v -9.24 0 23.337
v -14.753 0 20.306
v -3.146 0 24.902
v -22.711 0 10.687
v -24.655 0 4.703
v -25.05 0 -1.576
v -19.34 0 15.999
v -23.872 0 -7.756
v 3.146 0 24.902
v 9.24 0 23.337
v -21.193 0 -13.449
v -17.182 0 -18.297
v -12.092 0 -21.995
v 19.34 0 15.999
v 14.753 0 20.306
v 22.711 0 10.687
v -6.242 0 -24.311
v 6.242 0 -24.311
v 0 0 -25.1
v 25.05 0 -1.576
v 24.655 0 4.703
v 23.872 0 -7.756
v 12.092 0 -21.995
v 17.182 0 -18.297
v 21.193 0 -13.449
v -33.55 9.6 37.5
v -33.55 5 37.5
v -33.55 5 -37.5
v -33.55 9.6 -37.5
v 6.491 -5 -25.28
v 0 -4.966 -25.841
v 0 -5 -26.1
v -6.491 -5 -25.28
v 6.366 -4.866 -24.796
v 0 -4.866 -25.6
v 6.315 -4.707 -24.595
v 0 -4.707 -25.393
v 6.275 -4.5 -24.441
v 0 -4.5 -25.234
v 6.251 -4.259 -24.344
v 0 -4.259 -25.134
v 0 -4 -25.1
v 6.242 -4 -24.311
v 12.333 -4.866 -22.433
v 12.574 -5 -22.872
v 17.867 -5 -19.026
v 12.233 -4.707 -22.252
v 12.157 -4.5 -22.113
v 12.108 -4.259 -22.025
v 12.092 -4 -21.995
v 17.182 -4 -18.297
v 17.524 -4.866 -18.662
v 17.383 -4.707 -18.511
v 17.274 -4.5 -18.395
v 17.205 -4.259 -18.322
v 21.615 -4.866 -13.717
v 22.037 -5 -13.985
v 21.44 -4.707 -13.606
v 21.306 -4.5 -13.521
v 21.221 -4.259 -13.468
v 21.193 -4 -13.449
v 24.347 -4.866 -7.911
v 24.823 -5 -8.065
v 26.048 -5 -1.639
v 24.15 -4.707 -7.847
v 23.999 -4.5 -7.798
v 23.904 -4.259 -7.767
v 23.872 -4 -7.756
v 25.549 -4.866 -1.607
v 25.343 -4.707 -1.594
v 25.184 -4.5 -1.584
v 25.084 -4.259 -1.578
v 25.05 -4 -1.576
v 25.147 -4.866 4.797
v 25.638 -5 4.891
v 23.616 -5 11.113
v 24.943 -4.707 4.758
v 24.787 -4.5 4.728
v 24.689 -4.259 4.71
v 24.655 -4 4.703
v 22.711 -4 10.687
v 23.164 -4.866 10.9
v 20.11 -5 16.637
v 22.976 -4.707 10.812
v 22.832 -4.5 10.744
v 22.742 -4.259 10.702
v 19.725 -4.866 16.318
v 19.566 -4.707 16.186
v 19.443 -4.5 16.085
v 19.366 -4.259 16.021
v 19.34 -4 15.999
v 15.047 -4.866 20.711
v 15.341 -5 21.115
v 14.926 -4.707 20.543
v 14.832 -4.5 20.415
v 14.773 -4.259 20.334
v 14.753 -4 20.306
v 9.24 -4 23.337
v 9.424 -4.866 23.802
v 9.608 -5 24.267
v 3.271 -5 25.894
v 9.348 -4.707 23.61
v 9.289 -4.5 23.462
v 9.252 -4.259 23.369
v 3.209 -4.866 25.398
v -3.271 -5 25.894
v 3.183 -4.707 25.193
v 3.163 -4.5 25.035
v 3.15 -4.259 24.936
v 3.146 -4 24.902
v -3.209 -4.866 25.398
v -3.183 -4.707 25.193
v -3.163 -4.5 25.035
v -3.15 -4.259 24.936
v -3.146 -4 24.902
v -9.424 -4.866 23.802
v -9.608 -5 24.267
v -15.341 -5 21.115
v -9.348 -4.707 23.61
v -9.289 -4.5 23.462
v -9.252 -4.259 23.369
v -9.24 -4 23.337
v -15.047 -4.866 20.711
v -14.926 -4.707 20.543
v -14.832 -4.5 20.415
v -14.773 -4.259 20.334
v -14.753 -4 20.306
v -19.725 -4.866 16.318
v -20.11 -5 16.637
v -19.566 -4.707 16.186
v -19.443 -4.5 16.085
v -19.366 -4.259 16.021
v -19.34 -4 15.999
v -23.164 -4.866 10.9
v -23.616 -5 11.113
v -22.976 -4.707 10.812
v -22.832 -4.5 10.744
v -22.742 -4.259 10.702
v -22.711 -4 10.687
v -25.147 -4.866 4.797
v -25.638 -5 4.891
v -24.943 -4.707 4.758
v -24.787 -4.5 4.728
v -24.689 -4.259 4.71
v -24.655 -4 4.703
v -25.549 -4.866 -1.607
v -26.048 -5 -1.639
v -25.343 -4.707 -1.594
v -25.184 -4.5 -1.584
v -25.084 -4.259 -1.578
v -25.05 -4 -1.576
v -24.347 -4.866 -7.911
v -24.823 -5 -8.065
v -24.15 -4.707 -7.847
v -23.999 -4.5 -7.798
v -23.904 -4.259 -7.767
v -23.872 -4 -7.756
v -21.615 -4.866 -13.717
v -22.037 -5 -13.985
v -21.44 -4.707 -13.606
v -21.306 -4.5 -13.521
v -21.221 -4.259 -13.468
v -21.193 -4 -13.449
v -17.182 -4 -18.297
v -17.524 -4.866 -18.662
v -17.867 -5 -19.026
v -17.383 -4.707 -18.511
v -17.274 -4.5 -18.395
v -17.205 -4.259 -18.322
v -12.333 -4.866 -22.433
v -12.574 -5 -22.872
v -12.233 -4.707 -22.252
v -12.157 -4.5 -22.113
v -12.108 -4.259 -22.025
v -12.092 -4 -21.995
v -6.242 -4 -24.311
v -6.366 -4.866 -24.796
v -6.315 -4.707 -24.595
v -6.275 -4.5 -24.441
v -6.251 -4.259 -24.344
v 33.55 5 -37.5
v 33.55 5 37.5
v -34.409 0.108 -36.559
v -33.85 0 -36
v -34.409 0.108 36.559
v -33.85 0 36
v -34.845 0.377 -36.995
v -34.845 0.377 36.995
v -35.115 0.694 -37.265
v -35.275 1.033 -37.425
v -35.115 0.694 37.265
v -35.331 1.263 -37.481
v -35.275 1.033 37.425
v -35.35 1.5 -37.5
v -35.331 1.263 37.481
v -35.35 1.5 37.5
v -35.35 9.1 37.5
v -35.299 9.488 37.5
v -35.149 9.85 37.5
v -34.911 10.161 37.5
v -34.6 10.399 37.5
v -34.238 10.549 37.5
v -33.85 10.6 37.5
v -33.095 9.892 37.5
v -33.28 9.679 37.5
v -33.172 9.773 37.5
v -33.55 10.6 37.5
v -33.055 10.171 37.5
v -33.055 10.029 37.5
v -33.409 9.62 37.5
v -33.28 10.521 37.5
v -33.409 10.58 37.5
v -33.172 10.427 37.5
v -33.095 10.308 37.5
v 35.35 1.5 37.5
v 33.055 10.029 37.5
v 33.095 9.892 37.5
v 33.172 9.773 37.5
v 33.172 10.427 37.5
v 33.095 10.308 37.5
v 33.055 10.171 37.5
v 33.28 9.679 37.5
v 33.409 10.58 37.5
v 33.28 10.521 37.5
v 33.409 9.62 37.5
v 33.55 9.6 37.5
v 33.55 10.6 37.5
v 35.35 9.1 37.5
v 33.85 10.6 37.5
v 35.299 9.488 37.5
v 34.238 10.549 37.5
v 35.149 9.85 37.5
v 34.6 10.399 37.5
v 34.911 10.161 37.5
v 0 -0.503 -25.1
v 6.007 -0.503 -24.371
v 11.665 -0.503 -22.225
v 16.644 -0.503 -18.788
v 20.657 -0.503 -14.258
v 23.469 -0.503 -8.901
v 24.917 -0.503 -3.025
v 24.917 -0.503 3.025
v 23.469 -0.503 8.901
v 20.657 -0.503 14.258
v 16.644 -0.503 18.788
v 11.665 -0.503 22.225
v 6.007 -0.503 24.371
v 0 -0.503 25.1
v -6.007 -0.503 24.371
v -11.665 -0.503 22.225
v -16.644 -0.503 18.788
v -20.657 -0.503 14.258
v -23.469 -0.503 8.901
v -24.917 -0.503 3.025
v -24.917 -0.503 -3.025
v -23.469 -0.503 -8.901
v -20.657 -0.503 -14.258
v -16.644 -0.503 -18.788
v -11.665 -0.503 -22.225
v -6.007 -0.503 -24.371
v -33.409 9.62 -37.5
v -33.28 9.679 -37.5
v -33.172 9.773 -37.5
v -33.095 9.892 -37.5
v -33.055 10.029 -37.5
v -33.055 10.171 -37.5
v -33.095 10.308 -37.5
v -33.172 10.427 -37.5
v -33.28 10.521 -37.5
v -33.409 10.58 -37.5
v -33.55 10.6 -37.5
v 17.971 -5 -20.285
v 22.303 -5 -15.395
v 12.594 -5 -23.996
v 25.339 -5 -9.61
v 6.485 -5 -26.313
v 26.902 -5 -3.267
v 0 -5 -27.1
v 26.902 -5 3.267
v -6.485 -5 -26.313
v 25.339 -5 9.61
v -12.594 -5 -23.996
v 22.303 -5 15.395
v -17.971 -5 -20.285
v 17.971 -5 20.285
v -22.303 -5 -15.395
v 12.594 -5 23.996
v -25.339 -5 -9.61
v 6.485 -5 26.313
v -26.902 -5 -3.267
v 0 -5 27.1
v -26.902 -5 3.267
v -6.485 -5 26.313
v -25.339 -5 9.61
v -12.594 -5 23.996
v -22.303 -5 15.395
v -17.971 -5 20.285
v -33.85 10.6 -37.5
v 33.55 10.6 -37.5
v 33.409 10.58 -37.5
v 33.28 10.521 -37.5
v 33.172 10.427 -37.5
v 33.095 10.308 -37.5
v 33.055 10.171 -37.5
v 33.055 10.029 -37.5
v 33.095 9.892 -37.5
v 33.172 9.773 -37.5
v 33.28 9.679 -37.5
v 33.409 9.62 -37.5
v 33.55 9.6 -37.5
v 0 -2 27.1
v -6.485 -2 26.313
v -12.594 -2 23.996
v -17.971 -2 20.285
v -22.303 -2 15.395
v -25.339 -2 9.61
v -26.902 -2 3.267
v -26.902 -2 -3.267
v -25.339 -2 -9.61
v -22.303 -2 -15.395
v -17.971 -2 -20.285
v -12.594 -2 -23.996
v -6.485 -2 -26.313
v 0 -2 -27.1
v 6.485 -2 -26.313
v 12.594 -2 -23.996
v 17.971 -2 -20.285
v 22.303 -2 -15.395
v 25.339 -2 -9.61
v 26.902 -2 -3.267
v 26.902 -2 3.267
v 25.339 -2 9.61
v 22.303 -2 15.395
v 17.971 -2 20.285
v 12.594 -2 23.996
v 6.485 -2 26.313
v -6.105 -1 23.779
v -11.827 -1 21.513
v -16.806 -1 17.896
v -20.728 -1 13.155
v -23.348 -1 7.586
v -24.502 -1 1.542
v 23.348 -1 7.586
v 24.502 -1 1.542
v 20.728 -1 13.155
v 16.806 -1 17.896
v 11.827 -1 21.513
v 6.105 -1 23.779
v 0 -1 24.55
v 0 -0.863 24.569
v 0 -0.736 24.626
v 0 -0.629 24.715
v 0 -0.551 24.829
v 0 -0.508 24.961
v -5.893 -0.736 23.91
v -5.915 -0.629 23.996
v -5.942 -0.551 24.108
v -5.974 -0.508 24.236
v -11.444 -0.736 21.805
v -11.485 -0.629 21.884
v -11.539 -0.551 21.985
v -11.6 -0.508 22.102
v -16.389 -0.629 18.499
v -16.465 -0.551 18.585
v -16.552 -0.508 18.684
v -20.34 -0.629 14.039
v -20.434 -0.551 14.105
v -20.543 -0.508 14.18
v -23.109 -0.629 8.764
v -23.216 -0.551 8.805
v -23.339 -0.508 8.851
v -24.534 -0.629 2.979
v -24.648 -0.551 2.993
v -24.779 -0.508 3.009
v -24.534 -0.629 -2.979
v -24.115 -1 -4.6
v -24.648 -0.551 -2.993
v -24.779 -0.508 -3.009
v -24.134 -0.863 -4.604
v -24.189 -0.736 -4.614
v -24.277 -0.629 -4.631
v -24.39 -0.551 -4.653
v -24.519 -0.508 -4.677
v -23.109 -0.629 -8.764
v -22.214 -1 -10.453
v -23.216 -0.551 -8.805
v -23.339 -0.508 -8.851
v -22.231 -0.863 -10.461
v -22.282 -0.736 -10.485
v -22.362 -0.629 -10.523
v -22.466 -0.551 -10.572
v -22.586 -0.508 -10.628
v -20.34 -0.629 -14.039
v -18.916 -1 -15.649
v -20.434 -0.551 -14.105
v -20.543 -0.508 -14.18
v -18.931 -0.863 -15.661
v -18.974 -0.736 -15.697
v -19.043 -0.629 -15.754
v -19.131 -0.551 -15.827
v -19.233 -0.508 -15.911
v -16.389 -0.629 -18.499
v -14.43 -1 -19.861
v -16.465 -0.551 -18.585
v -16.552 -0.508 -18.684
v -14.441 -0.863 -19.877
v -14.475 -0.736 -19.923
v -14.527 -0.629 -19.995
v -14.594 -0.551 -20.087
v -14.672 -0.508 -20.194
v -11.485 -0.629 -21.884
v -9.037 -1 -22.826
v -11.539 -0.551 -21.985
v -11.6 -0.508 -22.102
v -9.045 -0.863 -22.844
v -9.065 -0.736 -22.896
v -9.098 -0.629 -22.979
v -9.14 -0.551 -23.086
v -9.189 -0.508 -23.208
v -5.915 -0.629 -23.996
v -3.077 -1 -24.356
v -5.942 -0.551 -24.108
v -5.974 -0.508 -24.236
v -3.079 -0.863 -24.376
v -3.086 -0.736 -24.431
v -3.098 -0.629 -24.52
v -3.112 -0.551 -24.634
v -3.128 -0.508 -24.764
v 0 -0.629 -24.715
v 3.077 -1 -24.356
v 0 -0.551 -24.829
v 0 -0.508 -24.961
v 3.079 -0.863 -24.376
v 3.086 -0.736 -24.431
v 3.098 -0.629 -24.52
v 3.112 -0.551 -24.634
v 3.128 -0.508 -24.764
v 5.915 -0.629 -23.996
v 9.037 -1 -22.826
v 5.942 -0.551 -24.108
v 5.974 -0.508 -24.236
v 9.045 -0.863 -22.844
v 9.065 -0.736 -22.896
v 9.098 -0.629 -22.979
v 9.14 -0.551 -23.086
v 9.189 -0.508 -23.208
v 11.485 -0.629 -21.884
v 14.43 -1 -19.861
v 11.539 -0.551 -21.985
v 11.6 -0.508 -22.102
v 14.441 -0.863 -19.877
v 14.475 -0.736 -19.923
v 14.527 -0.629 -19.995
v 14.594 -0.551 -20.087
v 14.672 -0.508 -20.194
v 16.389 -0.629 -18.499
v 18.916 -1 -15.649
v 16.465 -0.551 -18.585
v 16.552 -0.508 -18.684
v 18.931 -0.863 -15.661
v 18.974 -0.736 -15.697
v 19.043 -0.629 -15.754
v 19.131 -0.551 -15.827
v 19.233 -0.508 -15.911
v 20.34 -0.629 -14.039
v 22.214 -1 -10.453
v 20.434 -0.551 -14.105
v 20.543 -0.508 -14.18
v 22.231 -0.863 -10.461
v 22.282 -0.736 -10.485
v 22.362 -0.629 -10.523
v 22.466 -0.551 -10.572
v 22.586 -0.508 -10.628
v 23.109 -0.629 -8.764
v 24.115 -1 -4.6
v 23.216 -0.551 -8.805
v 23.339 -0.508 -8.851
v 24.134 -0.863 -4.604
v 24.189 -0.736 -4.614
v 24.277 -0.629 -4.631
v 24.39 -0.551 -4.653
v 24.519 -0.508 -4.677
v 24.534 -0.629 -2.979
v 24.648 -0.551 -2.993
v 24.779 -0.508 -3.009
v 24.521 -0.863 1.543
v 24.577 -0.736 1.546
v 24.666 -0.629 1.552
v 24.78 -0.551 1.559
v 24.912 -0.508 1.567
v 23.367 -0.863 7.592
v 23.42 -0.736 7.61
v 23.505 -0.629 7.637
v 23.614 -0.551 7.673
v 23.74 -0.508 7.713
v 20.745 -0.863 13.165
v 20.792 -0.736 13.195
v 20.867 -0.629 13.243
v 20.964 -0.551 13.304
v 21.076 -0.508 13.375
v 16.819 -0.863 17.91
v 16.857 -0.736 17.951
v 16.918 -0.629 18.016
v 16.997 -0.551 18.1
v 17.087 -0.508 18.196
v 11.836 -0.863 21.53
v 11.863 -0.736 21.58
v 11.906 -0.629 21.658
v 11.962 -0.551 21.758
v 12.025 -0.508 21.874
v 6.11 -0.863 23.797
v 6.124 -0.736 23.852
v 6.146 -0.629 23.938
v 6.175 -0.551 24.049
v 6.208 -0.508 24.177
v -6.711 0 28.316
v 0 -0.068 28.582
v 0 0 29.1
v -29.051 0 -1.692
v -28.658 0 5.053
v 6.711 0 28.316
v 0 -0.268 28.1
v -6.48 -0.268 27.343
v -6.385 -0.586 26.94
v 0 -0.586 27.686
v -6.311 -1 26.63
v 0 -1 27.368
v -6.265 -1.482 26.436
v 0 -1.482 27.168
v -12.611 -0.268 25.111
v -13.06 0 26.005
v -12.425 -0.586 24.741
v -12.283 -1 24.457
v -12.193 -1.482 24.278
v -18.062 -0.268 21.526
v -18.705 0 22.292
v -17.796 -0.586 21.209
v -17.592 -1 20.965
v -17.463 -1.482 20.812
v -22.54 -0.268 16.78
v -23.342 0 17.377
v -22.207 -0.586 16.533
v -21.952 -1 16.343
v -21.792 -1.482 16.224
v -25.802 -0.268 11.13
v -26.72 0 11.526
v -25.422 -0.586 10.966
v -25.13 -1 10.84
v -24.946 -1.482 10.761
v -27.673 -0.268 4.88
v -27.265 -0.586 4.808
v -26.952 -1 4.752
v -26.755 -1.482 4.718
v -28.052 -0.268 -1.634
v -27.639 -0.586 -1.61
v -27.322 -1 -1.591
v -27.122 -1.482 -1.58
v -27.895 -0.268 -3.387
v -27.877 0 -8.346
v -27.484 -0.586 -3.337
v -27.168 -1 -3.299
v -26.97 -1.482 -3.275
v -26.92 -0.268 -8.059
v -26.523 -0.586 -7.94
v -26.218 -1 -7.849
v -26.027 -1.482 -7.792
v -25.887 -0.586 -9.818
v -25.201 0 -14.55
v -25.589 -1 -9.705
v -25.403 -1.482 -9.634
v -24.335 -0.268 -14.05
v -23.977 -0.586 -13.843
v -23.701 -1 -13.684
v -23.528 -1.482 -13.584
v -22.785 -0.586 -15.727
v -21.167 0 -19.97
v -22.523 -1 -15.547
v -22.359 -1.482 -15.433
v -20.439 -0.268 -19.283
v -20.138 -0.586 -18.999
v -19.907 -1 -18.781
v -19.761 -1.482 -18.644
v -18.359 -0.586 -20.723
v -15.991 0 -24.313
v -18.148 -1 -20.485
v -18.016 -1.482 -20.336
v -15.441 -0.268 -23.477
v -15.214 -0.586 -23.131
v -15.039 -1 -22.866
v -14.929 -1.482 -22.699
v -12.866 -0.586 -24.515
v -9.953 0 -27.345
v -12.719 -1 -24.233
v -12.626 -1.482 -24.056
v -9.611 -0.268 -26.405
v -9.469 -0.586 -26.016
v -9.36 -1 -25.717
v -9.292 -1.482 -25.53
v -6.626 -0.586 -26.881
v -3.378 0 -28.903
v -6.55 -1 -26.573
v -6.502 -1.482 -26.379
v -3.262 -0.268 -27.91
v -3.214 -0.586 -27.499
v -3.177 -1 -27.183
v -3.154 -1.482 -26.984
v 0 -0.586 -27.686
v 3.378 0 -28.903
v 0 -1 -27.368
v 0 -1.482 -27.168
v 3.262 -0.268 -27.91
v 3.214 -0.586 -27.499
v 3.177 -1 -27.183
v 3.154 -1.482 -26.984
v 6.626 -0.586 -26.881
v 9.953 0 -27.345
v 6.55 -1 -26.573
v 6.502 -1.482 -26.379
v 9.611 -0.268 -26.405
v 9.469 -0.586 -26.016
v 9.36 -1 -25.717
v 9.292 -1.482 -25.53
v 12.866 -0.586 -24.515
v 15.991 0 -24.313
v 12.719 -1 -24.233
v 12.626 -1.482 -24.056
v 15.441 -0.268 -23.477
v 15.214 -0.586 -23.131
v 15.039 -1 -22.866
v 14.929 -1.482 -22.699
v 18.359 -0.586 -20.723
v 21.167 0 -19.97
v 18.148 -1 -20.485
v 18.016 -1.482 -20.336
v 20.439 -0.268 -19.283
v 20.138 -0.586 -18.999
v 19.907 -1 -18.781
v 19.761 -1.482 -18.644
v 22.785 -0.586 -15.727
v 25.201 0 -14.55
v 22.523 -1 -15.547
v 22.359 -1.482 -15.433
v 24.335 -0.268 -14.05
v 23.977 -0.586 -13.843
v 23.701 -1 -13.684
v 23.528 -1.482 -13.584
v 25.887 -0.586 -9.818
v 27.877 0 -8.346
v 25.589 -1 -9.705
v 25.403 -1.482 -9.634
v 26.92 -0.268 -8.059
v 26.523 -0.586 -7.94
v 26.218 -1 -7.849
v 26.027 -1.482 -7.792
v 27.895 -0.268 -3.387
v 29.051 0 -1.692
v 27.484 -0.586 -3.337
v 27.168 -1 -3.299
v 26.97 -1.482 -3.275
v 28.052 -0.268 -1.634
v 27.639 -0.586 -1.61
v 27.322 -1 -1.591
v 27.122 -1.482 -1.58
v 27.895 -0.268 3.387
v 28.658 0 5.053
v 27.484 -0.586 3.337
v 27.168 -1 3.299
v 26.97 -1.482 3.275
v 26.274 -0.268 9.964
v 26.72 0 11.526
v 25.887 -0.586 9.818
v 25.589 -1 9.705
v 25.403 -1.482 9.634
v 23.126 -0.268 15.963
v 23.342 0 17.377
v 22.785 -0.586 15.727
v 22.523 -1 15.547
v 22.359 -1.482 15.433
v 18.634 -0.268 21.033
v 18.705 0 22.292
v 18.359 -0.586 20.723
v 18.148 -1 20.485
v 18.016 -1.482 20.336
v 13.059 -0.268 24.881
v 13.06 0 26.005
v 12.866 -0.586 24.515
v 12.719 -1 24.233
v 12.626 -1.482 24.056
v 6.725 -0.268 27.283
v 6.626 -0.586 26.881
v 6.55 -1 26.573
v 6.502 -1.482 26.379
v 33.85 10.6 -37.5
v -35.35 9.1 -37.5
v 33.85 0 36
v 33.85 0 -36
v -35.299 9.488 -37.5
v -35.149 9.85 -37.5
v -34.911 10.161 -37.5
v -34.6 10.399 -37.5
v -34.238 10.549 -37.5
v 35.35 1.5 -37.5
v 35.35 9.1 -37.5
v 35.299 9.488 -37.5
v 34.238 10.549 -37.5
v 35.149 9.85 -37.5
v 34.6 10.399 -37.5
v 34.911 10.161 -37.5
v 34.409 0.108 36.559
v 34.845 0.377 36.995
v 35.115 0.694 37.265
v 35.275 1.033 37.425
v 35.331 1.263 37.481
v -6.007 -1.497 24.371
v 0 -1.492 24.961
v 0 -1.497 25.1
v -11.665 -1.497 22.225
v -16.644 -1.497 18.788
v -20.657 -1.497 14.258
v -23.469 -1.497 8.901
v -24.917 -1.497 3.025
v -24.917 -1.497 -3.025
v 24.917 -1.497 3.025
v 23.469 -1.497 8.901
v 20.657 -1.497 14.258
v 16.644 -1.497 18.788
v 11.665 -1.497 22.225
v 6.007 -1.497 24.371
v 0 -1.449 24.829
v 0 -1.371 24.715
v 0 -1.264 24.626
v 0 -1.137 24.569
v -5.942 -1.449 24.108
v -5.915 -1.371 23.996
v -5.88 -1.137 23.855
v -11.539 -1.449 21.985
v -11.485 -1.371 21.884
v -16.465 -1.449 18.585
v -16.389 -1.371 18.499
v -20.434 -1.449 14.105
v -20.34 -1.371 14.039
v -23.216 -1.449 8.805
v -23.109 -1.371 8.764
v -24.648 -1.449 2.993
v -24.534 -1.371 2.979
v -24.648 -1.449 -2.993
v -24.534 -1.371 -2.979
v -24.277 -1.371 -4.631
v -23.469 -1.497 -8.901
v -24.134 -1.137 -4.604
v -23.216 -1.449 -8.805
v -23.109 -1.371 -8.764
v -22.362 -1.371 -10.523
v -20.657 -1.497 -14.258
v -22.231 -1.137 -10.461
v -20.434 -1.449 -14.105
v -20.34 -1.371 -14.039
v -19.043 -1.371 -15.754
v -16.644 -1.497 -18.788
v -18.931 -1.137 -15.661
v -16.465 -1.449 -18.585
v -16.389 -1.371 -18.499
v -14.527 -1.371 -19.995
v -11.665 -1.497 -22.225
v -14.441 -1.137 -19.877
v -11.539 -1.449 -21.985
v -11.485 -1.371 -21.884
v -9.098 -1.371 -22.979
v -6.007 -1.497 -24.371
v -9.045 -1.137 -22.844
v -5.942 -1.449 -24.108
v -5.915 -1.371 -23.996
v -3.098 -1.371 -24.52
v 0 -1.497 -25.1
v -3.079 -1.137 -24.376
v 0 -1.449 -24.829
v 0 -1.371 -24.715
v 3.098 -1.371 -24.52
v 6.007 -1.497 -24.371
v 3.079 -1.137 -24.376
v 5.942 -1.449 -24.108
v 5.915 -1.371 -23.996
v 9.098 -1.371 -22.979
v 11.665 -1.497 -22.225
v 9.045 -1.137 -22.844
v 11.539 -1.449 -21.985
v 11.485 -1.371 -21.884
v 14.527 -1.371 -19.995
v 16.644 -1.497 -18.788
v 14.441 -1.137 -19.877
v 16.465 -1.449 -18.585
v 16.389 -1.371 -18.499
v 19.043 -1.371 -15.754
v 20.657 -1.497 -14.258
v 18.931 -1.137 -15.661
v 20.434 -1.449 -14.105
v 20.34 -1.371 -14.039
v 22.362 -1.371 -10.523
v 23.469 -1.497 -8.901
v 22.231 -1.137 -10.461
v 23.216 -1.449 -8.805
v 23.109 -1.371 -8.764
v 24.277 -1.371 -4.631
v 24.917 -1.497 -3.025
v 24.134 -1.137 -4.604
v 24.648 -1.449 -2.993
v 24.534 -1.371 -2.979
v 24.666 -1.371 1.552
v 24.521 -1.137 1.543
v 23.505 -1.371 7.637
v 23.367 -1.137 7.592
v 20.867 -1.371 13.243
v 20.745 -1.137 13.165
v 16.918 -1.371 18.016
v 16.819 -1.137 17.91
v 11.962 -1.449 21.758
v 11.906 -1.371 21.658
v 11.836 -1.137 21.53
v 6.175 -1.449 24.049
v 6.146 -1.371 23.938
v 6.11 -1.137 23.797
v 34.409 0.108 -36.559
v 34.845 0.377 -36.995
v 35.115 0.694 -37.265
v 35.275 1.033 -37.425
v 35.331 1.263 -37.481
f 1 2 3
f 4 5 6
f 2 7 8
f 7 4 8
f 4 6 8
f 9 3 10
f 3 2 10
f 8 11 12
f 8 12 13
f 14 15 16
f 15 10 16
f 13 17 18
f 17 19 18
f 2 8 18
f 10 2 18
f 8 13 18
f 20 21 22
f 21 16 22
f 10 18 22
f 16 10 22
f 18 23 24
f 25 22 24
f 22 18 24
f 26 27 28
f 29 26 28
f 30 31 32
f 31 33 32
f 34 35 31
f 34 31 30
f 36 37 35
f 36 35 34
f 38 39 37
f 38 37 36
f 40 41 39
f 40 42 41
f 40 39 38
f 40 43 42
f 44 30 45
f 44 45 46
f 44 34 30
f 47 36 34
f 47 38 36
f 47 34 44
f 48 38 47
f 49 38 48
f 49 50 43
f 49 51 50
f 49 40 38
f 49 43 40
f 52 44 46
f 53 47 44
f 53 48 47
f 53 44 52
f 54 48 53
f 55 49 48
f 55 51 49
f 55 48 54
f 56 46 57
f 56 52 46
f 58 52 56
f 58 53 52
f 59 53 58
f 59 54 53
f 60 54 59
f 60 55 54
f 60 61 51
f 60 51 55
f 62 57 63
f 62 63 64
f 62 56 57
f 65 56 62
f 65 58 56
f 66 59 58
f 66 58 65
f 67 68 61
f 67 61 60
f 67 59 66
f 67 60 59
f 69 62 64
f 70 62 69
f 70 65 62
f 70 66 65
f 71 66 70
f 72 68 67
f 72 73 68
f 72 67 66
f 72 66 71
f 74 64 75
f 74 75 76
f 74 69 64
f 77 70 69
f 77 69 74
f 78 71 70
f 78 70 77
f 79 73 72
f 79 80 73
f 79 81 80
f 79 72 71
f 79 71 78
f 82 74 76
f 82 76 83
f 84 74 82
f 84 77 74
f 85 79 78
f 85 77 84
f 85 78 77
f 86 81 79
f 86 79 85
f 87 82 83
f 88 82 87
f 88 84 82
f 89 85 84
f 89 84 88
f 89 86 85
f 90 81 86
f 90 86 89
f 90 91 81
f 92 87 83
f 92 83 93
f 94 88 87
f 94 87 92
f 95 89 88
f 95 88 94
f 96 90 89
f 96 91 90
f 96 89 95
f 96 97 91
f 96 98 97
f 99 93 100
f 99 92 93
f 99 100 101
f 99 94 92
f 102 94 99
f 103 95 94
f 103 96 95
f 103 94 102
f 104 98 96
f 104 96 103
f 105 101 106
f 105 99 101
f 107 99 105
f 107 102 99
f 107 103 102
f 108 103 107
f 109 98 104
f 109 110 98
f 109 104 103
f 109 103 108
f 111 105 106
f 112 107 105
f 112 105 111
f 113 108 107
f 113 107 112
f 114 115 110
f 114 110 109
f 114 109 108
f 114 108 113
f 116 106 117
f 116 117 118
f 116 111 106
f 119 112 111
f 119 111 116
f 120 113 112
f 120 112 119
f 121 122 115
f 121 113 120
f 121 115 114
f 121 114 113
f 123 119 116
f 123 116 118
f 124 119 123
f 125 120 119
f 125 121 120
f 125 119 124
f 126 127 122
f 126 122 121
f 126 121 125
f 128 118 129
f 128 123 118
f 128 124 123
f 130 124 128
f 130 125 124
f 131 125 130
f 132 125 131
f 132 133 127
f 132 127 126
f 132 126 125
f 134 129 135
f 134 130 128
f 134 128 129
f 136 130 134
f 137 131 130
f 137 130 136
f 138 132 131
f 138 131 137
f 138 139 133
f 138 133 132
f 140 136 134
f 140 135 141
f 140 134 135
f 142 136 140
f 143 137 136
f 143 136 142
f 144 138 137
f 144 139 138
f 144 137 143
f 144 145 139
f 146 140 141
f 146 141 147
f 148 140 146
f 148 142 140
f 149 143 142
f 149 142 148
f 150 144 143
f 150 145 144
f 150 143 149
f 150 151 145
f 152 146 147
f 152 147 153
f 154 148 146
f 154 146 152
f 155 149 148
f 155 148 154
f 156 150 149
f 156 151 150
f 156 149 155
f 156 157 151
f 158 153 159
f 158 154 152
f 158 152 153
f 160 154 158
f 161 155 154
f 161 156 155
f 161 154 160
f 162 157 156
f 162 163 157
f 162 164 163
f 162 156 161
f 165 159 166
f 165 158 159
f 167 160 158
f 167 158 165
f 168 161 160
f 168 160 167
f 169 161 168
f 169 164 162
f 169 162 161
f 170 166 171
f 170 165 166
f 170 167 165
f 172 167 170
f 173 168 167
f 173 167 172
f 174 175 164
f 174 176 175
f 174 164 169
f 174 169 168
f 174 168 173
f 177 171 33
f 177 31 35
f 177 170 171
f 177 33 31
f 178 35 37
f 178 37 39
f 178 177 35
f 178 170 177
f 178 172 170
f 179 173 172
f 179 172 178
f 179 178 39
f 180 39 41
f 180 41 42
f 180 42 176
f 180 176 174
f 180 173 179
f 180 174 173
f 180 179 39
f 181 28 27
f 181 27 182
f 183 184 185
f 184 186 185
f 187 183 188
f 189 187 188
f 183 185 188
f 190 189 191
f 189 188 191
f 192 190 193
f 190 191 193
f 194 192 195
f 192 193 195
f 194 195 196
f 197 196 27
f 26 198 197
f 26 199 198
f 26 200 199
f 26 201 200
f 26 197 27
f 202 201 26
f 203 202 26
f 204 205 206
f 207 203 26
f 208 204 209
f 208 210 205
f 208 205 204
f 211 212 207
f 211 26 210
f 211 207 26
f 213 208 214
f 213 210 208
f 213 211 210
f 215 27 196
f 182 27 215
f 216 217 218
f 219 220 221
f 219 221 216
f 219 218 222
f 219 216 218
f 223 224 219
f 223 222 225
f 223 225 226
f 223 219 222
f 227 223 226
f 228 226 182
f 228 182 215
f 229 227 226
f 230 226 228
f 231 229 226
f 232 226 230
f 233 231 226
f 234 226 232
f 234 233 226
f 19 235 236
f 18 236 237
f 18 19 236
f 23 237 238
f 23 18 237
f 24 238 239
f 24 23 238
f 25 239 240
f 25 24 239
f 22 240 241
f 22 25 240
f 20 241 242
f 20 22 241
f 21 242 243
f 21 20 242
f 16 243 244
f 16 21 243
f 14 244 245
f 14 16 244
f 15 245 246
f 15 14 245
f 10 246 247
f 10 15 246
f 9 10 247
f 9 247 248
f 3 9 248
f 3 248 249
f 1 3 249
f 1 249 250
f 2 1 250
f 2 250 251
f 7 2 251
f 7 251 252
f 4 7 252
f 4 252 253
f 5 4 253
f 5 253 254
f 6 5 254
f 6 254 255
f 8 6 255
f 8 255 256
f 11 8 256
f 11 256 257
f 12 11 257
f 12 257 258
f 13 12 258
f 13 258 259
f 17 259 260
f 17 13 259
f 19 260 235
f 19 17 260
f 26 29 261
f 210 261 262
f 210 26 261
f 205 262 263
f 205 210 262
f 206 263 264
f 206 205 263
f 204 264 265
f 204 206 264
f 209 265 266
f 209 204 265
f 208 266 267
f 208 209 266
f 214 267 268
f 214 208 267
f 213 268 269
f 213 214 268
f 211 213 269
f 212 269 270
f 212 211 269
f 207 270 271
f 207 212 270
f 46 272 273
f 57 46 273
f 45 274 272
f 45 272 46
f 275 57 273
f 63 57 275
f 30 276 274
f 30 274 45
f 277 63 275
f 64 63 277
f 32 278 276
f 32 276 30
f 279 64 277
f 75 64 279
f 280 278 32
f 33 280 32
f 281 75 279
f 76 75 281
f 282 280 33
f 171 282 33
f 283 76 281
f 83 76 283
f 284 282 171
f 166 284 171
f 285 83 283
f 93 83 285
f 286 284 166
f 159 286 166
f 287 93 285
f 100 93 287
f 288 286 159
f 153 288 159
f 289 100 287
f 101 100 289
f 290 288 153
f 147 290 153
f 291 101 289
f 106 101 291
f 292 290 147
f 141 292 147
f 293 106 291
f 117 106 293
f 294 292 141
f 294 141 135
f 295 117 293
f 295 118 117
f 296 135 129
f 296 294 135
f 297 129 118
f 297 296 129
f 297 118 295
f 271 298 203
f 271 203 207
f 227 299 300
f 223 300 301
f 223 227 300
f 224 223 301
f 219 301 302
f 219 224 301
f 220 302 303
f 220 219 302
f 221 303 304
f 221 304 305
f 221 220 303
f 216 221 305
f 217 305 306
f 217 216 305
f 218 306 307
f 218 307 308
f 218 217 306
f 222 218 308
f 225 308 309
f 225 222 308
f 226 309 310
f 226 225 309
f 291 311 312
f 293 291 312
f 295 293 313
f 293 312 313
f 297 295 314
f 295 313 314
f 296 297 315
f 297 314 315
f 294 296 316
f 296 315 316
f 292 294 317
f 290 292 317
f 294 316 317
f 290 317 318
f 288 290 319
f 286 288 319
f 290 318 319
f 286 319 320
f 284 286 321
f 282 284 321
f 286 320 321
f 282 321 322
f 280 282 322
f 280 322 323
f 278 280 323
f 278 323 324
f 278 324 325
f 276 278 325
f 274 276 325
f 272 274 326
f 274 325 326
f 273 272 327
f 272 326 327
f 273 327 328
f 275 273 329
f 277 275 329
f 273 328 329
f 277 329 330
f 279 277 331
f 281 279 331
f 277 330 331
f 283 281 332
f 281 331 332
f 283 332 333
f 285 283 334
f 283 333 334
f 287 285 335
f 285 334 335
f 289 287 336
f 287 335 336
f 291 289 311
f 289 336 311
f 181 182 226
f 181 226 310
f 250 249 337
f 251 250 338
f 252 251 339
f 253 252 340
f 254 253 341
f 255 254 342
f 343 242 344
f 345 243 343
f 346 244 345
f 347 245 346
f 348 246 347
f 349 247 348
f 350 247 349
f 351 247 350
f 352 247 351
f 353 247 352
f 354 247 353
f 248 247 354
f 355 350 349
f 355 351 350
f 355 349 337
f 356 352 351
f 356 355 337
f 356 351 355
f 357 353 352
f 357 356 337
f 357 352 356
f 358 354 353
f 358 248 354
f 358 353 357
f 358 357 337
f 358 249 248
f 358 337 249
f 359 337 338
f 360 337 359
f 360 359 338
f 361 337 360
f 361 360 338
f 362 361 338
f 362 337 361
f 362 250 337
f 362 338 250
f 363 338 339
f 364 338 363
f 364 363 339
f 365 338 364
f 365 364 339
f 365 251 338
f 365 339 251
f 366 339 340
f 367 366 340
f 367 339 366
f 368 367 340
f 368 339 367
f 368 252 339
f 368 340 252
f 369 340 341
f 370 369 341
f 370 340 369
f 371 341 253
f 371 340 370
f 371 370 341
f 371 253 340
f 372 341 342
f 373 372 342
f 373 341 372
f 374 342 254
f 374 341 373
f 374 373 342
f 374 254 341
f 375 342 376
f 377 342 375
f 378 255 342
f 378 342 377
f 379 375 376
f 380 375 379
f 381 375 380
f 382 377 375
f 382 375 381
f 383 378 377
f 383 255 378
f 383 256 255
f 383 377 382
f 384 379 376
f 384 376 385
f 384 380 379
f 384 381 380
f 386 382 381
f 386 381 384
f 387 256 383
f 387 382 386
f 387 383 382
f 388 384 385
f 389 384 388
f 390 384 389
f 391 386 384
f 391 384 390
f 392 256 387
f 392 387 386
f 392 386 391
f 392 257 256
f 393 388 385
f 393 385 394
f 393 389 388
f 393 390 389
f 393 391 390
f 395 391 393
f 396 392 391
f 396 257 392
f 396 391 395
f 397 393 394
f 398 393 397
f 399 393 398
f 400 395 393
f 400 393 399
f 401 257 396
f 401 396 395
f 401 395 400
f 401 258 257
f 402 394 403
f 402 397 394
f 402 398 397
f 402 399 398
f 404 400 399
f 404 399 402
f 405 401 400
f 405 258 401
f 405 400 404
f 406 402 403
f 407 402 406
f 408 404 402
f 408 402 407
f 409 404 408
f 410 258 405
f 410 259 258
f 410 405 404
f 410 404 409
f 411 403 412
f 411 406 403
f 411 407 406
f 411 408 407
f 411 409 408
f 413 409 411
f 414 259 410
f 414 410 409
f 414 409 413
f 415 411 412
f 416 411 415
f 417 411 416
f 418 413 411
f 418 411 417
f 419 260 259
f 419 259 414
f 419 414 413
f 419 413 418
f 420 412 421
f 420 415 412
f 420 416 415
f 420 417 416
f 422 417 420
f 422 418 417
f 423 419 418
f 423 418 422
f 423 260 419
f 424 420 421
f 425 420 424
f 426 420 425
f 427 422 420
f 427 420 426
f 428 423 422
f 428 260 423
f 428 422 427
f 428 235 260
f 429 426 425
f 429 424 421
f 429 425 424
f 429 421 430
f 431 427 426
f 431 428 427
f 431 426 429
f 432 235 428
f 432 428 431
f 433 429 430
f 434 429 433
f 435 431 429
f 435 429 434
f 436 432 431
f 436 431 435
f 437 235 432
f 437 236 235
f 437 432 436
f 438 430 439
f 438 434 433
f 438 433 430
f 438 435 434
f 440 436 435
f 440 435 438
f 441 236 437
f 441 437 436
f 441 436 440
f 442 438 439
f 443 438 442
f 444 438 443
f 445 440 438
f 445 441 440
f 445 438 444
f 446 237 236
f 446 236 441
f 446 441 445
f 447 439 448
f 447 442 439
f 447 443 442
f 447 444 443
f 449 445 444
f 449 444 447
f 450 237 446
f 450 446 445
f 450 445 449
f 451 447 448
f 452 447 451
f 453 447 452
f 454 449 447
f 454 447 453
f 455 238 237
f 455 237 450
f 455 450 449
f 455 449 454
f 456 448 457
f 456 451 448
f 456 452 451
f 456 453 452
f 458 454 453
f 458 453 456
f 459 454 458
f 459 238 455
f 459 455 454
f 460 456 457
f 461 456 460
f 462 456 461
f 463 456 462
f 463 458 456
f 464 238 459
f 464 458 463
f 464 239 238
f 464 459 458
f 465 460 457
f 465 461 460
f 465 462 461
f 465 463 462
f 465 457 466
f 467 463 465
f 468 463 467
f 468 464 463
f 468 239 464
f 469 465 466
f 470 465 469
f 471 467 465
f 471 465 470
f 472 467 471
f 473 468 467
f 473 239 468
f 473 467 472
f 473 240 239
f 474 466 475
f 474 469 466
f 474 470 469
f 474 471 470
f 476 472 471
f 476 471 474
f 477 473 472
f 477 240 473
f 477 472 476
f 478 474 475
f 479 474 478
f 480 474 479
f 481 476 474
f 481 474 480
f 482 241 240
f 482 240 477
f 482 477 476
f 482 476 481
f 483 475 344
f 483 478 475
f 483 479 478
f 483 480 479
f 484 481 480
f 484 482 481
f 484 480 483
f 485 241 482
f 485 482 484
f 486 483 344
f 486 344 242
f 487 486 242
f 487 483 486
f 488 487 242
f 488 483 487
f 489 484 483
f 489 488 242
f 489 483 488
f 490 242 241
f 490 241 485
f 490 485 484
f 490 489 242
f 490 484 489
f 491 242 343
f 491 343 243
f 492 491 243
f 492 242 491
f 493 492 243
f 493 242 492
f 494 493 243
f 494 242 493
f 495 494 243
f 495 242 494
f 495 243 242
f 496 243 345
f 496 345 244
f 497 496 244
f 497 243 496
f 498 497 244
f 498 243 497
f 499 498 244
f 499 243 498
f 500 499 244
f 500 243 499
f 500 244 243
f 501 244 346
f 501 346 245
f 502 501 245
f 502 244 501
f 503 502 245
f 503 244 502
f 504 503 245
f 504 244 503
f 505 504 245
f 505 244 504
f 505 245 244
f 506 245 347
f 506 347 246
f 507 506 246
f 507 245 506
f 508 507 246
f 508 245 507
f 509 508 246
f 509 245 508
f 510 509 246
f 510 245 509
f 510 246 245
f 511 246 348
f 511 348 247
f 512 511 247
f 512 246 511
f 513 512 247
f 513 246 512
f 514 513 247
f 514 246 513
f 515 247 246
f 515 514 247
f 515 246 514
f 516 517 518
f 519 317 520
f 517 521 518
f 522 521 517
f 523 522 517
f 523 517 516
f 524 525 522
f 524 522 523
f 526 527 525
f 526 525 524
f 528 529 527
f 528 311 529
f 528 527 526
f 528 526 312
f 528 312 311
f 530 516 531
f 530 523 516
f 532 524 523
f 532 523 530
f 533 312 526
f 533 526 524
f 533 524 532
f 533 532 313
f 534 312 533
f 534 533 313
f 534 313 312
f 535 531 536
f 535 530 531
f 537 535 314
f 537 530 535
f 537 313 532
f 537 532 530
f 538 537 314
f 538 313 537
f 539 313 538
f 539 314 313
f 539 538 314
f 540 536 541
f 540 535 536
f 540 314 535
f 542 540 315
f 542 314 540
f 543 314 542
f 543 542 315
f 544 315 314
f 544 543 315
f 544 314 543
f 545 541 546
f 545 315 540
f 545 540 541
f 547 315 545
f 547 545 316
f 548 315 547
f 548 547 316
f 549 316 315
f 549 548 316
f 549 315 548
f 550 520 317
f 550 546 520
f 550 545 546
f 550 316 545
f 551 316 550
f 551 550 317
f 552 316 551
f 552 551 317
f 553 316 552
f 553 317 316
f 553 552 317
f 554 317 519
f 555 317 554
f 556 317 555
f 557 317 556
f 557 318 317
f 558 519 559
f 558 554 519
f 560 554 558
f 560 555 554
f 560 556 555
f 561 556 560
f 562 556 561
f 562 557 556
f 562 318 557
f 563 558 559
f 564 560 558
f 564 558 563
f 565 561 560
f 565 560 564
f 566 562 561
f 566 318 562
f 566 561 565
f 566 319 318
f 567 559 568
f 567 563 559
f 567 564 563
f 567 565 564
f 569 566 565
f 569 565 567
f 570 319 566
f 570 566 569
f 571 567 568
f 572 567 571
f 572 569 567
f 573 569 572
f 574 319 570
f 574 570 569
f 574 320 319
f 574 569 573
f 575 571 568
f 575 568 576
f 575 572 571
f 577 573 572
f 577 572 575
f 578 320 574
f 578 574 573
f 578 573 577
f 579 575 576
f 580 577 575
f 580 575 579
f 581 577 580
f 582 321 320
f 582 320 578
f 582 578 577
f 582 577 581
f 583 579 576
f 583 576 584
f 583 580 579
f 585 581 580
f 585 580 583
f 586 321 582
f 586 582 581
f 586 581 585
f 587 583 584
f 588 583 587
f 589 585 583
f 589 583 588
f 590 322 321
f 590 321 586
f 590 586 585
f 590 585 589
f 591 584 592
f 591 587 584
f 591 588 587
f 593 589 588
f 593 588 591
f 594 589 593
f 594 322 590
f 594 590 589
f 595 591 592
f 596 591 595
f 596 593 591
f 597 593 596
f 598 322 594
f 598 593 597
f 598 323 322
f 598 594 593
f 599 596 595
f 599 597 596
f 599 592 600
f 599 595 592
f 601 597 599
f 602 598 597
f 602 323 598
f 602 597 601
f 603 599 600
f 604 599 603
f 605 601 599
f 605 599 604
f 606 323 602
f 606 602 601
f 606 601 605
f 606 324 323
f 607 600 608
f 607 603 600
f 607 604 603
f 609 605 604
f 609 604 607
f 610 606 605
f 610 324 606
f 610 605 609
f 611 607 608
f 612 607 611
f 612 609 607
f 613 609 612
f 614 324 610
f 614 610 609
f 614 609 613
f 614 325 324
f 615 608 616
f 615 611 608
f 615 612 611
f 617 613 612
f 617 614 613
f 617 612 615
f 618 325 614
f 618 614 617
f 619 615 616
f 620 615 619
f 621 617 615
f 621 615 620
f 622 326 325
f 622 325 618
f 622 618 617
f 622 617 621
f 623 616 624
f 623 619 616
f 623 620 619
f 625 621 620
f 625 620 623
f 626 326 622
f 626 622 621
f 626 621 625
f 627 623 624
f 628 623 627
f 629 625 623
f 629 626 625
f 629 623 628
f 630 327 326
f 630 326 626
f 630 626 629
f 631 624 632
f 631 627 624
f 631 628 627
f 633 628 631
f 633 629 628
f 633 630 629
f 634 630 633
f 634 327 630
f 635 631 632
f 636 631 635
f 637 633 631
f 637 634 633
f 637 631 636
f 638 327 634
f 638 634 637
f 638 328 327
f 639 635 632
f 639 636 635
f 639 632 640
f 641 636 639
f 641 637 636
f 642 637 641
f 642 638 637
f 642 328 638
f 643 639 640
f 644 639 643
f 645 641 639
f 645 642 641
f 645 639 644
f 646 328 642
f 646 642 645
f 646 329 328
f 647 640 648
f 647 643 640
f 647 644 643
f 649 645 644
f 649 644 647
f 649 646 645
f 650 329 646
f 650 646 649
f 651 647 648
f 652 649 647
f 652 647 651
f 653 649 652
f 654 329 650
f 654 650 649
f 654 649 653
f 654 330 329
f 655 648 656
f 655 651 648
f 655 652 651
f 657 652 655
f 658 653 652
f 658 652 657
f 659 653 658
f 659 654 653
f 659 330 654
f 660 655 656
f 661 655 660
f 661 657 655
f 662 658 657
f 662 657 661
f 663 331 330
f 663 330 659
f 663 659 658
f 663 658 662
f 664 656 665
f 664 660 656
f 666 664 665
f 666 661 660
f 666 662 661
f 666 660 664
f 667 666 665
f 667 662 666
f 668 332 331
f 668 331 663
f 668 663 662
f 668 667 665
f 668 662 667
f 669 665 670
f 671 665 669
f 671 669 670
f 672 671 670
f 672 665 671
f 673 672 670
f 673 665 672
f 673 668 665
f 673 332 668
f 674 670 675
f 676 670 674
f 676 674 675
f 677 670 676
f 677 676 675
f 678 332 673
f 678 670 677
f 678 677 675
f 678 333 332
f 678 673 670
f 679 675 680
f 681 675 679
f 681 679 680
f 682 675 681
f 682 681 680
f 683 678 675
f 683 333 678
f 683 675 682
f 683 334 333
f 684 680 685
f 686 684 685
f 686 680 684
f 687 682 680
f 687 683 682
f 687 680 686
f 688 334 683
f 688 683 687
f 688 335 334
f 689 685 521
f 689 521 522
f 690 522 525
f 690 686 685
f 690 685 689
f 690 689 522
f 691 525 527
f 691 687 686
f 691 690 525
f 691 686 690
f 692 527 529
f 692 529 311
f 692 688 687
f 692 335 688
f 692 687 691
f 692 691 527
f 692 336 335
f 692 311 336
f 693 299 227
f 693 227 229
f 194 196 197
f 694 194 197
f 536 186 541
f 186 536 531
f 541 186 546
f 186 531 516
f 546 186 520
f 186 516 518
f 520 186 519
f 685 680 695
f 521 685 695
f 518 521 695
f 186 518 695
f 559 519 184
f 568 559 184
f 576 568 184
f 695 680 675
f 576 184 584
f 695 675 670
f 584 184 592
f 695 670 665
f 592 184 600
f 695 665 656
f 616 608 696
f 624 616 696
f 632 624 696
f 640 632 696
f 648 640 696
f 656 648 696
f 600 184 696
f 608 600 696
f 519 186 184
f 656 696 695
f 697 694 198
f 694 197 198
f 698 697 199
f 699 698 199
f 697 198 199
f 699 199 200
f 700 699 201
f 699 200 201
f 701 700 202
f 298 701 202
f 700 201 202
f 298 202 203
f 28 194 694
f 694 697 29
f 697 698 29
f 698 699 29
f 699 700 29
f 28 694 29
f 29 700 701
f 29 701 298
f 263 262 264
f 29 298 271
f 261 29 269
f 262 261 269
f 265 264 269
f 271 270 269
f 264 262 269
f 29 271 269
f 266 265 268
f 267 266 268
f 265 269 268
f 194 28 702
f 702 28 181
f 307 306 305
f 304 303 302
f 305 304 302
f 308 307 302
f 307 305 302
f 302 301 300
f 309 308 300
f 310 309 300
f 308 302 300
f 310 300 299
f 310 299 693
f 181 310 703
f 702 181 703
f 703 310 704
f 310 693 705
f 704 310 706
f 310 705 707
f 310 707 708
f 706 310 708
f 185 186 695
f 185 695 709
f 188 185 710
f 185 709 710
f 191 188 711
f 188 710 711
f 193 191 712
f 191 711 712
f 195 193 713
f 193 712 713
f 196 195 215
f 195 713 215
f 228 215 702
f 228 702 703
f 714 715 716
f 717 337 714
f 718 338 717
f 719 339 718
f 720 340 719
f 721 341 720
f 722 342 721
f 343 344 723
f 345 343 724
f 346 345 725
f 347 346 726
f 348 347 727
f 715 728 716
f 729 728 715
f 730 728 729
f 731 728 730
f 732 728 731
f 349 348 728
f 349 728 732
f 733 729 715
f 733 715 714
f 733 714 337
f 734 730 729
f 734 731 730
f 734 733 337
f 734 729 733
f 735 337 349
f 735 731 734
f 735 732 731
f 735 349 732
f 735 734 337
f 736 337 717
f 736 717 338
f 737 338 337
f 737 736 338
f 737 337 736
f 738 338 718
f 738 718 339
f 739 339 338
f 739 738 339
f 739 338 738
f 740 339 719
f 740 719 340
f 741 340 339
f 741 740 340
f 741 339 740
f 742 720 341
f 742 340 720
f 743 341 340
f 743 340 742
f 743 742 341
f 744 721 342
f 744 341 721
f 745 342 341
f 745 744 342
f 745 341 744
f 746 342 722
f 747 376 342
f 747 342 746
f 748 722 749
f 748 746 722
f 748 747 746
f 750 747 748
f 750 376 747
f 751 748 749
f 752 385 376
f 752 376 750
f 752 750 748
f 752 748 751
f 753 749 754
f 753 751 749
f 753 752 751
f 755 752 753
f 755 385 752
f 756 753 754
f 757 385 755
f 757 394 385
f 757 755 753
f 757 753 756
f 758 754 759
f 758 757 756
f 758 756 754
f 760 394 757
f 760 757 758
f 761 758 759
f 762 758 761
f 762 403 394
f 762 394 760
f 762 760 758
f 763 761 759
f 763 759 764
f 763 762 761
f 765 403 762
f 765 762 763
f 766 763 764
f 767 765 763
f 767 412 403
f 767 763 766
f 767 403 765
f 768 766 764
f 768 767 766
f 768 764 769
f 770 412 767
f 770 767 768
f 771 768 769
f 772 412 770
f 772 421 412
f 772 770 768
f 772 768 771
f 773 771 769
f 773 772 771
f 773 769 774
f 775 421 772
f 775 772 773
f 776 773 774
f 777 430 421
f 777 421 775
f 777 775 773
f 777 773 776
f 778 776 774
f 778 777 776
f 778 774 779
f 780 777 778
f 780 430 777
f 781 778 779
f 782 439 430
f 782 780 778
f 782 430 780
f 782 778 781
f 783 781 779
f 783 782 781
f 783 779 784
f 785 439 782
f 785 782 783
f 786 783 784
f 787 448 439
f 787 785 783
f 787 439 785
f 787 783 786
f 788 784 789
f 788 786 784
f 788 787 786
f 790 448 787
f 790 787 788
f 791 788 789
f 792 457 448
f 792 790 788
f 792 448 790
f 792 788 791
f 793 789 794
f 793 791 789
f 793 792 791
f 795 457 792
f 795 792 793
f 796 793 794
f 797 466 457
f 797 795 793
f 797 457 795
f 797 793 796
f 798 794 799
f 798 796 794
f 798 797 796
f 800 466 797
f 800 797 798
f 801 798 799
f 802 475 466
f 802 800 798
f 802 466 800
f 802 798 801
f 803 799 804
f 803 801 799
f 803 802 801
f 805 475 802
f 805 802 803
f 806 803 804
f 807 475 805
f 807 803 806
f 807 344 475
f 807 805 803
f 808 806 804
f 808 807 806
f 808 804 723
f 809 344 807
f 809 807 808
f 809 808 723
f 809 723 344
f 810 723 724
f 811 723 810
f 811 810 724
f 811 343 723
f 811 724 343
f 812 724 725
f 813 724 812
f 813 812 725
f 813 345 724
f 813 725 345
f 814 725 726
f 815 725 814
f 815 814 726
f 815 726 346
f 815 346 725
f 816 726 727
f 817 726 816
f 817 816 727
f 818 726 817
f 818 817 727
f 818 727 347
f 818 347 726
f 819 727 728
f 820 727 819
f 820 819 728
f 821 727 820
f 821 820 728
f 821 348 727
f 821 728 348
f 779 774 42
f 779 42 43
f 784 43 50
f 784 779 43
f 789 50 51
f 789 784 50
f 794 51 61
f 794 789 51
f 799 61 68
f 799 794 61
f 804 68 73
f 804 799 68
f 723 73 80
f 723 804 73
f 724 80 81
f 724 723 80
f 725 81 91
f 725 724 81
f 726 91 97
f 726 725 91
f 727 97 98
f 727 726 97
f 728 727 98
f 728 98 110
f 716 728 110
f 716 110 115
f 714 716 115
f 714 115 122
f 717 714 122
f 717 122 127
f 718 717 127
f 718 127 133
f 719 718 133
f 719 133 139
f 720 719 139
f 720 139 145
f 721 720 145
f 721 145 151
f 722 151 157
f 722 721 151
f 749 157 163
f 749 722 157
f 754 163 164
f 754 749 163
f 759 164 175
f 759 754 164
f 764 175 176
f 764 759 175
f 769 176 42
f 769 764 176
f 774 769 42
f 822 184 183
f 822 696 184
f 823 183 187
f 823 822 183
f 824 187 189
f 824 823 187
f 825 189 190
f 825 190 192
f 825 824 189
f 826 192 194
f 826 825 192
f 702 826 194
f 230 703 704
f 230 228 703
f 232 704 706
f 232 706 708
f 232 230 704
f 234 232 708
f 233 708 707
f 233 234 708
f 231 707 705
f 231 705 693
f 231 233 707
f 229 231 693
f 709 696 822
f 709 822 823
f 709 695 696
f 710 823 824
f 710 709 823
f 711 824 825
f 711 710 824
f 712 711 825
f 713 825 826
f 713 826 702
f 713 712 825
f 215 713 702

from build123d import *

# Parameters (mm, degrees)
SKETCH1_W           = 72.5
SKETCH1_H           = 75
BOSS_EXTRUDE1_DEPTH = 5
SKETCH2_R           = 27.1
SKETCH2_R_2         = 25.1
BOSS_EXTRUDE2_DEPTH = 5
SKETCH4_W           = 2.7
SKETCH4_H           = 75
BOSS_EXTRUDE3_DEPTH = 5.6
SKETCH5_R           = 0.5
BOSS_EXTRUDE4_DEPTH = 75
SKETCH6_W           = 0.9
SKETCH6_H           = 10.6
CUT_EXTRUDE1_DEPTH  = 84.972748556
FILLET1_R           = 2
FILLET2_R           = 1
FILLET3_R           = 1.5
FILLET4_R           = 1.5
SKETCH3_R           = 0.5


with BuildPart() as part:
    # Sketch1 → Boss-Extrude1 (new body)
    with BuildSketch(Plane(origin=(0, 0, 0), x_dir=(1, 0, 0), z_dir=(0, 1, 0))):
        Rectangle(SKETCH1_W, SKETCH1_H)
    extrude(amount=BOSS_EXTRUDE1_DEPTH)

    # Sketch2 → Boss-Extrude2 (add)
    with BuildSketch(Plane.XZ):
        with Locations(Location((0, 0, 0), (0, 0, 90))):
            Circle(SKETCH2_R)
        with Locations(Location((0, 0, 0), (0, 0, 270))):
            Circle(SKETCH2_R_2, mode=Mode.SUBTRACT)
    extrude(amount=BOSS_EXTRUDE2_DEPTH)

    # Sketch4 → Boss-Extrude3 (add)
    with BuildSketch(Plane(origin=(0, 5, 0), x_dir=(1, 0, 0), z_dir=(0, 1, 0))):
        with Locations((-34.9, 0)):
            Rectangle(SKETCH4_W, SKETCH4_H)
        with Locations((34.9, 0)):
            Rectangle(SKETCH4_W, SKETCH4_H)
    extrude(amount=BOSS_EXTRUDE3_DEPTH)

    # Sketch5 → Boss-Extrude4 (add)
    with BuildSketch(Plane.XY.offset(37.5)):
        with Locations((-33.55, 10.1)):
            Circle(SKETCH5_R)
        with Locations((33.55, 10.1)):
            Circle(SKETCH5_R)
    extrude(amount=-BOSS_EXTRUDE4_DEPTH)

    # Sketch6 → Cut-Extrude1 (cut, through all)
    with BuildSketch(Plane(origin=(0, 0, -37.5), x_dir=(-1, 0, 0), z_dir=(0, 0, -1))):
        with Locations((-35.8, 5.3)):
            Rectangle(SKETCH6_W, SKETCH6_H)
        with Locations((35.8, 5.3)):
            Rectangle(SKETCH6_W, SKETCH6_H)
    extrude(amount=-CUT_EXTRUDE1_DEPTH, mode=Mode.SUBTRACT)

    # Fillet1
    fillet1_edges = [part.edges().sort_by_distance(p)[0] for p in [
        (0, 0, -27.1),
    ]]
    fillet(fillet1_edges, radius=FILLET1_R)

    # Fillet2
    fillet2_edges = [part.edges().sort_by_distance(p)[0] for p in [
        (0, -5, 25.1),
    ]]
    fillet(fillet2_edges, radius=FILLET2_R)

    # Fillet3
    fillet3_edges = [part.edges().sort_by_distance(p)[0] for p in [
        (0, 0, -37.5),
        (0, 0, 37.5),
        (35.35, 0, 0),
        (-35.35, 0, 0),
    ]]
    fillet(fillet3_edges, radius=FILLET3_R)

    # Fillet4
    fillet4_edges = [part.edges().sort_by_distance(p)[0] for p in [
        (35.35, 10.6, 0),
        (-35.35, 10.6, 0),
    ]]
    fillet(fillet4_edges, radius=FILLET4_R)

    # Sketch3 → Revolve1 (revolve)
    with BuildSketch(Plane(origin=(0, 0, 0), x_dir=(0, 0, -1), z_dir=(1, 0, 0))):
        with Locations((-25.05, -1)):
            Circle(SKETCH3_R)
    revolve(axis=Axis((0, 0, 0), (0, -1, 0)))


solid = part.part
